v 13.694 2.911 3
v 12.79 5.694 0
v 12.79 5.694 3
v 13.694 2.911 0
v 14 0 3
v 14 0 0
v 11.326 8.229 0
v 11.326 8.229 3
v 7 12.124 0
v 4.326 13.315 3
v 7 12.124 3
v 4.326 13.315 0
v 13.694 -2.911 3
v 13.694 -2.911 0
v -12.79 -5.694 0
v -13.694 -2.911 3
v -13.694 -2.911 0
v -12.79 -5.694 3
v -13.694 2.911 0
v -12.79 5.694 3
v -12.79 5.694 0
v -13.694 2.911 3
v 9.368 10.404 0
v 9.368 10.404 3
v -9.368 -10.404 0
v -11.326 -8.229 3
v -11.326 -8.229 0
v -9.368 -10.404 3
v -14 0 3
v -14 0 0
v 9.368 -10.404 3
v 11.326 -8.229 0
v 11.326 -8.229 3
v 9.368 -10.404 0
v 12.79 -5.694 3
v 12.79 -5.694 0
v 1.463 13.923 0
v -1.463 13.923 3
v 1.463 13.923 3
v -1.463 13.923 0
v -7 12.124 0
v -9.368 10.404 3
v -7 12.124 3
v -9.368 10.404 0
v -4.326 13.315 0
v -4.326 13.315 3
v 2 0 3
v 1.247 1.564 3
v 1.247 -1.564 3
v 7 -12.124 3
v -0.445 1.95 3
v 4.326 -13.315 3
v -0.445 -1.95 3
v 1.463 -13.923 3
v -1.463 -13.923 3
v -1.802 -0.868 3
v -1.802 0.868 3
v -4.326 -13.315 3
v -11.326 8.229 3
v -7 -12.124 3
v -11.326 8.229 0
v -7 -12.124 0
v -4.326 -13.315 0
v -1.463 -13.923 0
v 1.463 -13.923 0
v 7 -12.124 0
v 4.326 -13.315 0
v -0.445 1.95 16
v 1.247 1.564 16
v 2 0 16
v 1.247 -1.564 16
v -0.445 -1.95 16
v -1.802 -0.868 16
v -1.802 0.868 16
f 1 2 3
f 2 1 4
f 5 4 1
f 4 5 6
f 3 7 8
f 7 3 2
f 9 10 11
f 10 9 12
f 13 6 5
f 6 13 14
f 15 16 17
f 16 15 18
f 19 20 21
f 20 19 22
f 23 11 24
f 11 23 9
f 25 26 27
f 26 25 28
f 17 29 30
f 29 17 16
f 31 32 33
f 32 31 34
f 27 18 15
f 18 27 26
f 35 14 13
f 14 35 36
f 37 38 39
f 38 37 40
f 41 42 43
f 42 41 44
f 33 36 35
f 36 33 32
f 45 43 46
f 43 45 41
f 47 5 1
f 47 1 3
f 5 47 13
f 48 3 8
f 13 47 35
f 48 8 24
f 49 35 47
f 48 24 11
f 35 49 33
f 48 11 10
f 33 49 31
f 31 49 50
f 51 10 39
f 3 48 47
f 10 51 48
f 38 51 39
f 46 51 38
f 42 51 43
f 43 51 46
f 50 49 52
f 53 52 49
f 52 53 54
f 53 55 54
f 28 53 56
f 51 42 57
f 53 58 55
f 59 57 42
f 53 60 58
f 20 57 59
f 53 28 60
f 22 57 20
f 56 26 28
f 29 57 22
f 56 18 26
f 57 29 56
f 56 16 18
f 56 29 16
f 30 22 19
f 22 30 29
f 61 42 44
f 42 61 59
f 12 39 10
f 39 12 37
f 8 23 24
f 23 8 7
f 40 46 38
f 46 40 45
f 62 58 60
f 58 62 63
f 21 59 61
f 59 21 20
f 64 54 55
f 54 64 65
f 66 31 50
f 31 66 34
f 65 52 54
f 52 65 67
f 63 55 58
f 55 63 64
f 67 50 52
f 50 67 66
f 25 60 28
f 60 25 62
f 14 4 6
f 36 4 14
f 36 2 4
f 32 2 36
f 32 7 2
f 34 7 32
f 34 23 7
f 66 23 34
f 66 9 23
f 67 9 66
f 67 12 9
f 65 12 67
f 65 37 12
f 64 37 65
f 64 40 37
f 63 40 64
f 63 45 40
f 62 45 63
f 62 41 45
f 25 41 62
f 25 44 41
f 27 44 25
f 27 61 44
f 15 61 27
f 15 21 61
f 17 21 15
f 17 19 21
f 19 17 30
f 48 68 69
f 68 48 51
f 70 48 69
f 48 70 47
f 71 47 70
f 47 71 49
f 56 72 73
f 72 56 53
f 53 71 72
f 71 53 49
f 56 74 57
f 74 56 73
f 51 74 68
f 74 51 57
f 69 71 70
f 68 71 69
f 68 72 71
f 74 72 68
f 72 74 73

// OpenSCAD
// part_id: sp2
// name: SP2 gear and axle subassembly
// source_drawing_ids: DRW-056
// units: mm
// revision: 0.1-placeholder
// SPDX-License-Identifier: MIT

module part_sp2(gear_od = 28, gear_thickness = 3, bore_d = 4, axle_d = 4, axle_h = 16) {
    union() {
        difference() {
            cylinder(d = gear_od, h = gear_thickness, center = false);
            translate([0, 0, -0.1]) cylinder(d = bore_d, h = gear_thickness + 0.2, center = false);
        }
        cylinder(d = axle_d, h = axle_h, center = false);
    }
}


// ---- "main guard" ----
// Default to previewing when opened directly:
if (is_undef(__LIB_MODE__)) {
    part_sp2();
}
